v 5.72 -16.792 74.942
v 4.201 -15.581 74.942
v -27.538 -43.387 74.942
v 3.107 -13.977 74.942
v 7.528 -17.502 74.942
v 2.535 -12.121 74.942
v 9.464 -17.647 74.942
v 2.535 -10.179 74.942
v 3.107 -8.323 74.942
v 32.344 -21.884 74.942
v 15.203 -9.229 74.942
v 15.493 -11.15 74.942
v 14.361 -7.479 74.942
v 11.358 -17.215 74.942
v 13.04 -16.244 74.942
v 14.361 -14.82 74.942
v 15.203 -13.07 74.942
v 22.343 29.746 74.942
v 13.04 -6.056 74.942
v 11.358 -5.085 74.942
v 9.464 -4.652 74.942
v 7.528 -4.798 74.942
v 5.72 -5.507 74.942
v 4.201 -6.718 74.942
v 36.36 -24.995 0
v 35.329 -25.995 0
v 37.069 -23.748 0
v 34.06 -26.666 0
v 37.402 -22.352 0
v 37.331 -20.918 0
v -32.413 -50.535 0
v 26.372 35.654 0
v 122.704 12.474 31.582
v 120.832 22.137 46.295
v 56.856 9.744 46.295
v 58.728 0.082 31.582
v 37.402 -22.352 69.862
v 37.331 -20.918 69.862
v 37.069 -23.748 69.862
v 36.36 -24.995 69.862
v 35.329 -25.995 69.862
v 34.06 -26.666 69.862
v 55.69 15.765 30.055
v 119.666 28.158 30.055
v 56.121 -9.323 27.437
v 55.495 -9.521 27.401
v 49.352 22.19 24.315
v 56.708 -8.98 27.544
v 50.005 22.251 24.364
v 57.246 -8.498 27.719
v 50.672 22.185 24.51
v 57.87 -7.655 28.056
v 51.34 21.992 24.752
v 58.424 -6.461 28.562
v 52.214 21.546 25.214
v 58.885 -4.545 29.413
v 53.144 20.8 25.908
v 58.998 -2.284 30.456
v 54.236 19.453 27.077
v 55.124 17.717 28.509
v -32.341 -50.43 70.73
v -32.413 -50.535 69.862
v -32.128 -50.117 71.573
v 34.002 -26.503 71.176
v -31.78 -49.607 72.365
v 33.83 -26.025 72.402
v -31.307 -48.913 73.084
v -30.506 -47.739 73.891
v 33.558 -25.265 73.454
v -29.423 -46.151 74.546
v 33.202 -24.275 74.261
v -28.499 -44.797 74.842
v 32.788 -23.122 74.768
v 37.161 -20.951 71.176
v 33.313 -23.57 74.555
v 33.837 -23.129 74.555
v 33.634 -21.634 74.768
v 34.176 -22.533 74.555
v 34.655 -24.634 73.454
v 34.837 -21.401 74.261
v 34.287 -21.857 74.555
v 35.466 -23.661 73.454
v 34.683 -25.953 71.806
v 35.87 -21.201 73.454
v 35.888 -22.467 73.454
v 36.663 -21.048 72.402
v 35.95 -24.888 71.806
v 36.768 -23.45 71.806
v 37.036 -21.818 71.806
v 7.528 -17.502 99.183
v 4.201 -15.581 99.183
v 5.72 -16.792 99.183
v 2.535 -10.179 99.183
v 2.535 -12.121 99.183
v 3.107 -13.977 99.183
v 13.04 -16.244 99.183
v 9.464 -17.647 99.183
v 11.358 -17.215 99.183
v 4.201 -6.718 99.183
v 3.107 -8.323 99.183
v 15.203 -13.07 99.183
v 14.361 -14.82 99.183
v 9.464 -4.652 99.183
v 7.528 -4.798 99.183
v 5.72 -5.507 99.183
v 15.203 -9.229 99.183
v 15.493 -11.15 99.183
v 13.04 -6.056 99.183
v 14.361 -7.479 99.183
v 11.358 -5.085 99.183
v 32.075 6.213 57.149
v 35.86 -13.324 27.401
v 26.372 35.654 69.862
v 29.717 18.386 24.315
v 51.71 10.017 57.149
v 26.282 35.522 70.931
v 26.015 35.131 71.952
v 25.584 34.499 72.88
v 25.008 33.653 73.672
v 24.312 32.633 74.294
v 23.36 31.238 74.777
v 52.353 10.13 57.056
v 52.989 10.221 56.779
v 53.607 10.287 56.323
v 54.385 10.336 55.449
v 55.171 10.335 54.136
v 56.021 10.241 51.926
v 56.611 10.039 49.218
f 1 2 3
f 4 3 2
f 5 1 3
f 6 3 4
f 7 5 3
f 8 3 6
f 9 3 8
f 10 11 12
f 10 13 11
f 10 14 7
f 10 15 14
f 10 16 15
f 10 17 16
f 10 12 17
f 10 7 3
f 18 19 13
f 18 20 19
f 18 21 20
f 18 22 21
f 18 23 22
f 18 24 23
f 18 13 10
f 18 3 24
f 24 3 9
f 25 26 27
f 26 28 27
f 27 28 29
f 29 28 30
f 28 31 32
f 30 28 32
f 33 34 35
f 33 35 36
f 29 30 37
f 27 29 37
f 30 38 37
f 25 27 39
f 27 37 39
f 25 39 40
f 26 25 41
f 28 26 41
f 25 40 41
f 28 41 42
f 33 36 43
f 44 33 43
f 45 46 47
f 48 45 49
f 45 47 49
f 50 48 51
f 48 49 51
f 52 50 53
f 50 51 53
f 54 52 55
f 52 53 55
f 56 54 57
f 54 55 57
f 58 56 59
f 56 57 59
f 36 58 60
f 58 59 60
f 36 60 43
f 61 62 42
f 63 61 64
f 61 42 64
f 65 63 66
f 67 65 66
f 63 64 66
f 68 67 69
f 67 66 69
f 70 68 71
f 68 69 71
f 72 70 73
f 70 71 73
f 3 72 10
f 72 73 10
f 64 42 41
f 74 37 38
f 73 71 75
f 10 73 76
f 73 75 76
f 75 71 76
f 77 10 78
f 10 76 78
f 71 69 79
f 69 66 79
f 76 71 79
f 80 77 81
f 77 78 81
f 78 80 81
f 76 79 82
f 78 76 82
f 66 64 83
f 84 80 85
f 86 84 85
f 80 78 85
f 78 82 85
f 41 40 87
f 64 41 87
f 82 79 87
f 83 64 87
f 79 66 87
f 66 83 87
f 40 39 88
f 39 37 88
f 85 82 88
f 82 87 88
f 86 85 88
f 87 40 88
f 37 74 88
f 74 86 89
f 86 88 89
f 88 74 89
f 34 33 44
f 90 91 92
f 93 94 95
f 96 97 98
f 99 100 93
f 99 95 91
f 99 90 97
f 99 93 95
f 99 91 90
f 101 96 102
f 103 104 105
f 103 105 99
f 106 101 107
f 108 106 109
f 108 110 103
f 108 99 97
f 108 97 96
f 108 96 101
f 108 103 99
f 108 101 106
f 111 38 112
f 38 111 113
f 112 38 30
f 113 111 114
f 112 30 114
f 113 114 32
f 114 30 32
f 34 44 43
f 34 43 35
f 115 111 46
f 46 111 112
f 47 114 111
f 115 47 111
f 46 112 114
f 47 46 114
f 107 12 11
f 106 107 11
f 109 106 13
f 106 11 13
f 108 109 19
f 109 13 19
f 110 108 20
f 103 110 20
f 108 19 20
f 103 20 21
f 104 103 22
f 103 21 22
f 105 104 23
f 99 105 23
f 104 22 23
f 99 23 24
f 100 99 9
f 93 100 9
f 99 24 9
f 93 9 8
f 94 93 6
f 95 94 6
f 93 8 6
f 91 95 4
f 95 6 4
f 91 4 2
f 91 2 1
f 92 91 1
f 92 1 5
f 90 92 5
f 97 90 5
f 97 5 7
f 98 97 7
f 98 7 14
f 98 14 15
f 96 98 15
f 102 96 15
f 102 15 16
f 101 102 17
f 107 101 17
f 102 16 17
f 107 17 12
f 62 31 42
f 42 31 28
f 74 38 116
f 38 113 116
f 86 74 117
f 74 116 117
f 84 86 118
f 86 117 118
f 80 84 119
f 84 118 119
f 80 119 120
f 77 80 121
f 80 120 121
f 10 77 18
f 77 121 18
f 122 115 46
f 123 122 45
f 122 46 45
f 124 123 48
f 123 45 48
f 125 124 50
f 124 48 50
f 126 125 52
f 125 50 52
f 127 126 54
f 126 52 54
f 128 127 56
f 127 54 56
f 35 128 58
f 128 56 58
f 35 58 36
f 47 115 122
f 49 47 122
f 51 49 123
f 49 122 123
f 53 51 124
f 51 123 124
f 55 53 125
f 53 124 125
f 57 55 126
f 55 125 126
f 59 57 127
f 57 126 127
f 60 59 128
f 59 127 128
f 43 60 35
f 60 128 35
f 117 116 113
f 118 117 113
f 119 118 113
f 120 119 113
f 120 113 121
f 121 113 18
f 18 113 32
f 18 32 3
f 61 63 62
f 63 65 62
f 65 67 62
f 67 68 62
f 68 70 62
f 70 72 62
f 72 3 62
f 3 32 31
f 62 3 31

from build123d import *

# Parameters (mm, degrees)
F1_DEPTH = 74.9415531754
F2_R     = 5.08
F3_R     = 6.5155077524
F4_DEPTH = 24.241162464
F6_DEPTH = 25
F7_R     = 5
F8_DEPTH = 25
F9_DEPTH = 40.1649922132


with BuildPart() as f1:
    # F0 (on Top) → F1 (new body)
    with BuildSketch(Plane.XY):
        Polygon((38.1590723991, -25.1938253641), (26.3724923134, 35.654425621), (-32.413110137, -50.5349785089), align=None)
    extrude(amount=F1_DEPTH)

    # F2
    f2_edges = [f1.edges().sort_by_distance(p)[0] for p in [
        (2.872981, -37.864402, 74.941553),
        (32.265782, 5.2303, 74.941553),
        (38.159072, -25.193825, 37.470777),
    ]]
    fillet(f2_edges, radius=F2_R)

    # F3 (on face) → F4 (join)
    with BuildSketch(Plane.XY.offset(74.9415531754)):
        with Locations((8.9773815125, -11.1496802419)):
            Circle(F3_R)
    extrude(amount=F4_DEPTH)

    # F5 (on face) → F6 (join)
    with BuildSketch(Plane(origin=(32.0754000375, 6.2131493544, 0), x_dir=(-0.1901696352, 0.9817512464, 0), z_dir=(0.9817512464, 0.1901696352, 0))):
        Polygon((0, 57.1491196752), (-19.9005380273, 27.401227504), (12.399494648, 24.3145730346), align=None)
    extrude(amount=F6_DEPTH)

    # F7
    f7_edges = [f1.edges().sort_by_distance(p)[0] for p in [
        (55.440178, 17.054, 40.731846),
        (57.332417, 7.285311, 25.8579),
        (58.51142, 1.198701, 42.275174),
    ]]
    fillet(f7_edges, radius=F7_R)

    # F8 (add): a face of the model
    f8_faces = [f1.faces().sort_by_distance(p)[0] for p in [
        (57.091234066, 8.5304160504, 35.9772892723),
    ]]
    extrude(f8_faces, amount=F8_DEPTH)

    # F9 (add): a face of the model
    f9_faces = [f1.faces().sort_by_distance(p)[0] for p in [
        (81.6350152267, 13.2846569295, 35.9772892723),
    ]]
    extrude(f9_faces, amount=F9_DEPTH)


solid = f1.part
